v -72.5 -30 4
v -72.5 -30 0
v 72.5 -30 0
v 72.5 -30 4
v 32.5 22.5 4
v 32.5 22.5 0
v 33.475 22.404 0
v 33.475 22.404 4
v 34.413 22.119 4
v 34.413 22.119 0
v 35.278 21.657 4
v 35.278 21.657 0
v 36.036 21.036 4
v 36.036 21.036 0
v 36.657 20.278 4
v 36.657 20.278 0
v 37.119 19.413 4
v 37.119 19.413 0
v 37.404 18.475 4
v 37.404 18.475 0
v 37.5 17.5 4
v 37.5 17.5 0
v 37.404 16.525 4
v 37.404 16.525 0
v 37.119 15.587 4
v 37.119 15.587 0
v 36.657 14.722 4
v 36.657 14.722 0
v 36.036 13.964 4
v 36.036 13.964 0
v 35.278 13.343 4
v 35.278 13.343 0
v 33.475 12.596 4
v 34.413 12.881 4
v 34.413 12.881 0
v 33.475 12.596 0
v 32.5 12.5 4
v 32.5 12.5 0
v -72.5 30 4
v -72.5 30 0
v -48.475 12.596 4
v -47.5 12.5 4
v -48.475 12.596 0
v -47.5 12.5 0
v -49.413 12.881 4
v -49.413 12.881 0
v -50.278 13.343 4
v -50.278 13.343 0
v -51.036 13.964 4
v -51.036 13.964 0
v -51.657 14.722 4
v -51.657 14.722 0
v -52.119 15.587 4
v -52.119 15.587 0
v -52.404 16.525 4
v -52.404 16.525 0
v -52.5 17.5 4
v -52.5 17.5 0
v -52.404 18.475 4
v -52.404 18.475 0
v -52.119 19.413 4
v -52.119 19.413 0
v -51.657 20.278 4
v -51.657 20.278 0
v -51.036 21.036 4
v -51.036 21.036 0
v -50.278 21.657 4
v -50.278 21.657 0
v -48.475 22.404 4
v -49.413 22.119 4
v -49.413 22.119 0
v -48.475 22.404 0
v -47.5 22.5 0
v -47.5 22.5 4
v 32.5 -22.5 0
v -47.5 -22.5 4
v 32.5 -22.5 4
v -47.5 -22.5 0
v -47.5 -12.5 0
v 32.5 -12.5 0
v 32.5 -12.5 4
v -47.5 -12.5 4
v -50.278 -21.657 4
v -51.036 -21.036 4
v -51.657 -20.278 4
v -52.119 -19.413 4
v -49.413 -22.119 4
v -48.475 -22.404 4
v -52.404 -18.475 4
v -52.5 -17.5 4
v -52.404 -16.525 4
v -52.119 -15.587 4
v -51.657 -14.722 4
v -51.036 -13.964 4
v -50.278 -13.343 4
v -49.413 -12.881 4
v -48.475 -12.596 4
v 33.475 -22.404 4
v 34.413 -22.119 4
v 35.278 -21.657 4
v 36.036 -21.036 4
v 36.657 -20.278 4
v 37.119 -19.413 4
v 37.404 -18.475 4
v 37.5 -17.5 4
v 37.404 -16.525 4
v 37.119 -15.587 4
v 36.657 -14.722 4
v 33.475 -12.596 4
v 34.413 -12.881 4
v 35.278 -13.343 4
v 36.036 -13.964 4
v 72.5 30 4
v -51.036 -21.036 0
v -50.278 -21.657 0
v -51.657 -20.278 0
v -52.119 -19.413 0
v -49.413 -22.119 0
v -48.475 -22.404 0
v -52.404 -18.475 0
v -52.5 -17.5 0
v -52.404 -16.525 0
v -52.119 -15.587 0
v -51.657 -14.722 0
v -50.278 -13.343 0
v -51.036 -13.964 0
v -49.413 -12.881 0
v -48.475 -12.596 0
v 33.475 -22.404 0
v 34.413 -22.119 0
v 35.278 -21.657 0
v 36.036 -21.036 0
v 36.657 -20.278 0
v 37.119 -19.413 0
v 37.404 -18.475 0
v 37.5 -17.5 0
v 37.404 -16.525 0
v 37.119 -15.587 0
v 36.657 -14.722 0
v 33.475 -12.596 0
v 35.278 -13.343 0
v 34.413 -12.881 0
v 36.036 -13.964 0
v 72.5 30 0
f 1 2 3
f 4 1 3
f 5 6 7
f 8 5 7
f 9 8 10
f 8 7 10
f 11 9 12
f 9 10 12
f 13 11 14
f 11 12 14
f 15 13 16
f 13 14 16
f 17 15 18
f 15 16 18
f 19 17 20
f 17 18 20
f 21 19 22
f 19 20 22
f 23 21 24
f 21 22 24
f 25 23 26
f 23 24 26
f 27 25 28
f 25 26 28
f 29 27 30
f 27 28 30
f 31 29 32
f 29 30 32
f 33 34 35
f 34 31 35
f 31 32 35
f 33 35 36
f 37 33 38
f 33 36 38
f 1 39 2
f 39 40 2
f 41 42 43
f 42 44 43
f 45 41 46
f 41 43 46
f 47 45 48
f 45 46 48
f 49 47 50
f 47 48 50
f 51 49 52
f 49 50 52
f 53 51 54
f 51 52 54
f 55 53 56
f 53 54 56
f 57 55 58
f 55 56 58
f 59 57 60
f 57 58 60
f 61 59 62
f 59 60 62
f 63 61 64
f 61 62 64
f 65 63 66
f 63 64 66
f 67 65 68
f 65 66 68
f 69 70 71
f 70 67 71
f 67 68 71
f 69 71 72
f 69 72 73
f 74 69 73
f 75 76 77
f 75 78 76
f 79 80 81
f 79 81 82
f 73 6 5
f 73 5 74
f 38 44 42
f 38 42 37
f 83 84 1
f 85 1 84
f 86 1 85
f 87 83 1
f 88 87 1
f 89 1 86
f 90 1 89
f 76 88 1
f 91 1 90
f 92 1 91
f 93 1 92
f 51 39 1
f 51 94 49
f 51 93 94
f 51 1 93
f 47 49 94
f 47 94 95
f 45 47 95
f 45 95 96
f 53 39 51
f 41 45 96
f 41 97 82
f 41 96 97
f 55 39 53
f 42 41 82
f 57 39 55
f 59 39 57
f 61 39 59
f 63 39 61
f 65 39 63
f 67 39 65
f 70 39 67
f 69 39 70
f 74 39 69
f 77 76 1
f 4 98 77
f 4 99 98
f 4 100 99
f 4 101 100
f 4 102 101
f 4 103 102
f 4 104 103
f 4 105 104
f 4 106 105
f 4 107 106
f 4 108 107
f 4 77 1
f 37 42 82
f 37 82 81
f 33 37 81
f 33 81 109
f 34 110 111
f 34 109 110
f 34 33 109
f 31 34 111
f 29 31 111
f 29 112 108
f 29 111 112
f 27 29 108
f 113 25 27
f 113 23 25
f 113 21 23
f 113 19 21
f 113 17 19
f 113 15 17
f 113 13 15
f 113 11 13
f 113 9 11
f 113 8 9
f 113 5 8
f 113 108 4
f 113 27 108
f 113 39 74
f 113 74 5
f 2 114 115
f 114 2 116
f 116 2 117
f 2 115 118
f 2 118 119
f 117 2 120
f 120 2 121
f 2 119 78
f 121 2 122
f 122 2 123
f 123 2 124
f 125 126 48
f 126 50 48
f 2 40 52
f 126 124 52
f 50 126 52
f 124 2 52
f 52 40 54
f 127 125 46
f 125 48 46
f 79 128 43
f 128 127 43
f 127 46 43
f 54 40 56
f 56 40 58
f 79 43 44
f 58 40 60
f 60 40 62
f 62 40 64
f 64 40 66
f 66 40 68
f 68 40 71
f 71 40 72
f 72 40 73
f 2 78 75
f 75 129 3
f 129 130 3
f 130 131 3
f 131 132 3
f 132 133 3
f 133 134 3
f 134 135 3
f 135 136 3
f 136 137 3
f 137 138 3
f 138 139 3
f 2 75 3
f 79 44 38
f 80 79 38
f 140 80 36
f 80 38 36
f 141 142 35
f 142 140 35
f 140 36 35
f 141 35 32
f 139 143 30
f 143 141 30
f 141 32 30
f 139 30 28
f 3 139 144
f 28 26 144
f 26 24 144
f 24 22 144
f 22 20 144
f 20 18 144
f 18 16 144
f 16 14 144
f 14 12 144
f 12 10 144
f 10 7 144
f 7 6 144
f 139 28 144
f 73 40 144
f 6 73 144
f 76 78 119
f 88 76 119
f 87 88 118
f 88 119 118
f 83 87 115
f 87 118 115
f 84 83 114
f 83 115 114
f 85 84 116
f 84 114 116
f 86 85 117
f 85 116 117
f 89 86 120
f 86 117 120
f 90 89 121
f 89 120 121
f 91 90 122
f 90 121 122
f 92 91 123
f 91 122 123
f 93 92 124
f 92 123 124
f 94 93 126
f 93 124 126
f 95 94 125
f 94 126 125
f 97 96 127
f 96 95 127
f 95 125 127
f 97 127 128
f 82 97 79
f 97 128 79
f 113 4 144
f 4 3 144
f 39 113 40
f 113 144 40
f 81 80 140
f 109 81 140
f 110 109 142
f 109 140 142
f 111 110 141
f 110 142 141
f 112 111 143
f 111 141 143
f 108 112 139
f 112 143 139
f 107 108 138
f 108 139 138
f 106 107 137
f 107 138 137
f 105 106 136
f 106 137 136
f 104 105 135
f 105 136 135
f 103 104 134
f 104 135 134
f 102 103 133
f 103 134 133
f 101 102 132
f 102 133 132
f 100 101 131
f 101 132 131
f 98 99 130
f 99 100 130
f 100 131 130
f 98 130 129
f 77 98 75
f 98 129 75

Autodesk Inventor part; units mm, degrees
ref_plane "YZ Plane" through (0, 0, 0) normal (1, 0, 0) x (0, 1, 0)
ref_plane "XZ Plane" through (0, 0, 0) normal (0, 1, 0) x (-1, 0, 0)
ref_plane "XY Plane" through (0, 0, 0) normal (0, 0, 1) x (1, 0, 0)
sketch "Sketch3" plane through (0, 0, 0) normal (0, 0, 1) x (1, 0, 0)
  line L0 (-101.5, 0) -> (101.5, 0) projected
  line L1 (0, -42) -> (0, 42) projected
  line L2 (-72.5, -30) -> (72.5, -30)
  line L3 (72.5, -30) -> (72.5, 30)
  line L4 (72.5, 30) -> (-72.5, 30)
  line L5 (-72.5, 30) -> (-72.5, -30)
  line L6 (-72.5, -30) -> (72.5, 30) construction
  line L7 (72.5, -30) -> (-72.5, 30) construction
  line L8 (-47.5, 17.5) -> (32.5, 17.5) construction
  line L9 (-47.5, 12.5) -> (32.5, 12.5)
  line L10 (32.5, 22.5) -> (-47.5, 22.5)
  arc A0 (-47.5, 22.5) -> (-47.5, 12.5) centre (-47.5, 17.5) ccw
  arc A1 (32.5, 12.5) -> (32.5, 22.5) centre (32.5, 17.5) ccw
  line L11 (-49.3038, -17.5) -> (32.5, -17.5) construction
  line L12 (-47.5, -22.5) -> (32.5, -22.5)
  line L13 (32.5, -12.5) -> (-47.5, -12.5)
  arc A2 (-47.5, -12.5) -> (-47.5, -22.5) centre (-47.5, -17.5) ccw
  arc A3 (32.5, -22.5) -> (32.5, -12.5) centre (32.5, -17.5) ccw
  point P0 (0, 0)
  dimension "d0" = 145
  dimension "d1" = 60
  dimension "d2" = 10
  dimension "d3" = 10
  dimension "d4" = 35
  dimension "d9" = 32.5
  dimension "d10" = 32.5
  dimension "d11" = 47.5
  dimension "d12" = 47.5
extrude "Extrusion1" add sketch "Sketch3" along normal blind 4 contours L5 L4 L1 L10 A0 L9 L0 | L0 L1 L13 A2 L12 L2 L5 | L1 L9 A1 L10 L4 L3 L0 | L0 L3 L2 L1 L12 A3 L13
equation "\"d3\" = d2"
equation "\"d10\" = d9"
equation "\"d12\" = d11"
equation "\"BendRadius\" = Thickness"
equation "\"BendReliefWidth\" = Thickness"
equation "\"BendReliefDepth\" = 0.5 * Thickness"
equation "\"CornerReliefSize\" = 4 * Thickness"
equation "\"MinimumRemnant\" = 2 * Thickness"
equation "\"TransitionRadius\" = BendRadius"
equation "\"JacobiRadiusSize\" = BendRadius"
equation "\"GapSize\" = Thickness"
equation "\"Thickness\" = 0.5"
properties part number "Motor holder slider"
